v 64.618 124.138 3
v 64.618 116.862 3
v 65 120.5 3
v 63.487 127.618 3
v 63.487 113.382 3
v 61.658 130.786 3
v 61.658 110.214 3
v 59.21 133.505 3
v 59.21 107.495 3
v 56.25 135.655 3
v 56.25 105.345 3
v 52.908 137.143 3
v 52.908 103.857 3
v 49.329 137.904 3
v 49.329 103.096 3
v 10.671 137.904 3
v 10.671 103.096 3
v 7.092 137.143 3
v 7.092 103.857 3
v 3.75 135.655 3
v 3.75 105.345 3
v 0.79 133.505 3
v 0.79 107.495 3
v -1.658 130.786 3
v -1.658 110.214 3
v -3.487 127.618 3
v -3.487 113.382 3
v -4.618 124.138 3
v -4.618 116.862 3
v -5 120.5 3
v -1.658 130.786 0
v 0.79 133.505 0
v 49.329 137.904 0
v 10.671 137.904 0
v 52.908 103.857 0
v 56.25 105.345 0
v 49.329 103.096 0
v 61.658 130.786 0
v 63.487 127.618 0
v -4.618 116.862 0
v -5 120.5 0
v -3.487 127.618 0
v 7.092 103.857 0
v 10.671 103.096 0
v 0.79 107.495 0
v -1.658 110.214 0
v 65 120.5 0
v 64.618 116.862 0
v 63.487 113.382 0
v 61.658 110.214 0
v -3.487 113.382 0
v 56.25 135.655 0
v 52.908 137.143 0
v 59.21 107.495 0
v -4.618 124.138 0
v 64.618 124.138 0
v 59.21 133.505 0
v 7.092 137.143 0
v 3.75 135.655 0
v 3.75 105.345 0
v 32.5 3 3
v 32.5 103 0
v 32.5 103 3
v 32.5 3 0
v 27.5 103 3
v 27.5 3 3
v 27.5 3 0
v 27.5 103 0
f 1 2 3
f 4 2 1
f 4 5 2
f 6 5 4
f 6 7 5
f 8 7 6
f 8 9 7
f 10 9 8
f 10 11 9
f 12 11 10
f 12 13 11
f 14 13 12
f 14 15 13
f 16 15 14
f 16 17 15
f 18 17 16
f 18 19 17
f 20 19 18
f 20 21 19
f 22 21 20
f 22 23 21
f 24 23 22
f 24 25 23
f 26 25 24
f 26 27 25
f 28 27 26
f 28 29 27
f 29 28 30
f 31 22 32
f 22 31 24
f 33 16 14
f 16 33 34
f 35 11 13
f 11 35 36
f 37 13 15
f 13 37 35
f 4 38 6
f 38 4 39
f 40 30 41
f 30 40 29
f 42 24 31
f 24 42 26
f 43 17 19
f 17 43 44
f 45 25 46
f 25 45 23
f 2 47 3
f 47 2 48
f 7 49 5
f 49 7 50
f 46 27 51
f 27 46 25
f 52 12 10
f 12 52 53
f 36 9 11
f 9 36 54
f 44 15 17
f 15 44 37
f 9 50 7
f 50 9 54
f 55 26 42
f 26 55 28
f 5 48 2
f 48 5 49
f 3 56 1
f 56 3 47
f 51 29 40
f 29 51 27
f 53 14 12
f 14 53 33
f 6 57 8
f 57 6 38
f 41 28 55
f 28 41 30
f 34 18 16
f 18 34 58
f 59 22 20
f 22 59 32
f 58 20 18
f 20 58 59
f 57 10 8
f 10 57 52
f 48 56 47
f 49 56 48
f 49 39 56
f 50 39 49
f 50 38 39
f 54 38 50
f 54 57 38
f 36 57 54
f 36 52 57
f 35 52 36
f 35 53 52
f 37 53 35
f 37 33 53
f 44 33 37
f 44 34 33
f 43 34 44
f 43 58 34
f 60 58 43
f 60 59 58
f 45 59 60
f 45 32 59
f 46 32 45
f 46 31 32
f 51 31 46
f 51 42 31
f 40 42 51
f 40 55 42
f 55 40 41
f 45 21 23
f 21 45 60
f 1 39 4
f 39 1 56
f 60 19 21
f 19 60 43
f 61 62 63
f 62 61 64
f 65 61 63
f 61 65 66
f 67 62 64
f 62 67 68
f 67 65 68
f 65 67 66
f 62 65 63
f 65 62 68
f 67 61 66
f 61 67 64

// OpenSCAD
//Customizeable Garden Signs

//Approximite Size For Each Letter
Size = 10;

//Text
Text = "LETTUCE";

//Letters In The Text
Letters = 7;

//Thickness
Thickness = 3;

//Center (Distance That The Base Will Go To The Left)
Centerx = -5;

//Center (Distance That The Base Will Go Up)
Centery = 3;

//Stake Width
Width = 5;

//Stake Length
Length = 100;


//Base(Green)
translate([0,Length,0]){
    difference(){
        translate([(Letters*Size)/4+Centerx,(Letters*Size)/4+Centery,0]){
            hull(){
                cylinder(Thickness,(Letters*Size)/4,(Letters*Size)/4);
                translate([(Letters*Size)/2,0,0]){
                    cylinder(Thickness,(Letters*Size)/4,(Letters*Size)/4);
                }
            }
        }
        //Letters(White)
        color("Gold"){
            translate([0,(Letters*Size)/4,0]){
                translate([0,0,Thickness]){
                    text(Text, Size, "Liberation Serif");
                }
            }
        }
    }
}

//Stake(Grey)
color("SlateGray"){
    translate([Centerx,Centery,0]){
        translate([(Letters*Size)/2-Width/2,0,0]){
            cube([Width,Length,Thickness]);
        }
    }
}
